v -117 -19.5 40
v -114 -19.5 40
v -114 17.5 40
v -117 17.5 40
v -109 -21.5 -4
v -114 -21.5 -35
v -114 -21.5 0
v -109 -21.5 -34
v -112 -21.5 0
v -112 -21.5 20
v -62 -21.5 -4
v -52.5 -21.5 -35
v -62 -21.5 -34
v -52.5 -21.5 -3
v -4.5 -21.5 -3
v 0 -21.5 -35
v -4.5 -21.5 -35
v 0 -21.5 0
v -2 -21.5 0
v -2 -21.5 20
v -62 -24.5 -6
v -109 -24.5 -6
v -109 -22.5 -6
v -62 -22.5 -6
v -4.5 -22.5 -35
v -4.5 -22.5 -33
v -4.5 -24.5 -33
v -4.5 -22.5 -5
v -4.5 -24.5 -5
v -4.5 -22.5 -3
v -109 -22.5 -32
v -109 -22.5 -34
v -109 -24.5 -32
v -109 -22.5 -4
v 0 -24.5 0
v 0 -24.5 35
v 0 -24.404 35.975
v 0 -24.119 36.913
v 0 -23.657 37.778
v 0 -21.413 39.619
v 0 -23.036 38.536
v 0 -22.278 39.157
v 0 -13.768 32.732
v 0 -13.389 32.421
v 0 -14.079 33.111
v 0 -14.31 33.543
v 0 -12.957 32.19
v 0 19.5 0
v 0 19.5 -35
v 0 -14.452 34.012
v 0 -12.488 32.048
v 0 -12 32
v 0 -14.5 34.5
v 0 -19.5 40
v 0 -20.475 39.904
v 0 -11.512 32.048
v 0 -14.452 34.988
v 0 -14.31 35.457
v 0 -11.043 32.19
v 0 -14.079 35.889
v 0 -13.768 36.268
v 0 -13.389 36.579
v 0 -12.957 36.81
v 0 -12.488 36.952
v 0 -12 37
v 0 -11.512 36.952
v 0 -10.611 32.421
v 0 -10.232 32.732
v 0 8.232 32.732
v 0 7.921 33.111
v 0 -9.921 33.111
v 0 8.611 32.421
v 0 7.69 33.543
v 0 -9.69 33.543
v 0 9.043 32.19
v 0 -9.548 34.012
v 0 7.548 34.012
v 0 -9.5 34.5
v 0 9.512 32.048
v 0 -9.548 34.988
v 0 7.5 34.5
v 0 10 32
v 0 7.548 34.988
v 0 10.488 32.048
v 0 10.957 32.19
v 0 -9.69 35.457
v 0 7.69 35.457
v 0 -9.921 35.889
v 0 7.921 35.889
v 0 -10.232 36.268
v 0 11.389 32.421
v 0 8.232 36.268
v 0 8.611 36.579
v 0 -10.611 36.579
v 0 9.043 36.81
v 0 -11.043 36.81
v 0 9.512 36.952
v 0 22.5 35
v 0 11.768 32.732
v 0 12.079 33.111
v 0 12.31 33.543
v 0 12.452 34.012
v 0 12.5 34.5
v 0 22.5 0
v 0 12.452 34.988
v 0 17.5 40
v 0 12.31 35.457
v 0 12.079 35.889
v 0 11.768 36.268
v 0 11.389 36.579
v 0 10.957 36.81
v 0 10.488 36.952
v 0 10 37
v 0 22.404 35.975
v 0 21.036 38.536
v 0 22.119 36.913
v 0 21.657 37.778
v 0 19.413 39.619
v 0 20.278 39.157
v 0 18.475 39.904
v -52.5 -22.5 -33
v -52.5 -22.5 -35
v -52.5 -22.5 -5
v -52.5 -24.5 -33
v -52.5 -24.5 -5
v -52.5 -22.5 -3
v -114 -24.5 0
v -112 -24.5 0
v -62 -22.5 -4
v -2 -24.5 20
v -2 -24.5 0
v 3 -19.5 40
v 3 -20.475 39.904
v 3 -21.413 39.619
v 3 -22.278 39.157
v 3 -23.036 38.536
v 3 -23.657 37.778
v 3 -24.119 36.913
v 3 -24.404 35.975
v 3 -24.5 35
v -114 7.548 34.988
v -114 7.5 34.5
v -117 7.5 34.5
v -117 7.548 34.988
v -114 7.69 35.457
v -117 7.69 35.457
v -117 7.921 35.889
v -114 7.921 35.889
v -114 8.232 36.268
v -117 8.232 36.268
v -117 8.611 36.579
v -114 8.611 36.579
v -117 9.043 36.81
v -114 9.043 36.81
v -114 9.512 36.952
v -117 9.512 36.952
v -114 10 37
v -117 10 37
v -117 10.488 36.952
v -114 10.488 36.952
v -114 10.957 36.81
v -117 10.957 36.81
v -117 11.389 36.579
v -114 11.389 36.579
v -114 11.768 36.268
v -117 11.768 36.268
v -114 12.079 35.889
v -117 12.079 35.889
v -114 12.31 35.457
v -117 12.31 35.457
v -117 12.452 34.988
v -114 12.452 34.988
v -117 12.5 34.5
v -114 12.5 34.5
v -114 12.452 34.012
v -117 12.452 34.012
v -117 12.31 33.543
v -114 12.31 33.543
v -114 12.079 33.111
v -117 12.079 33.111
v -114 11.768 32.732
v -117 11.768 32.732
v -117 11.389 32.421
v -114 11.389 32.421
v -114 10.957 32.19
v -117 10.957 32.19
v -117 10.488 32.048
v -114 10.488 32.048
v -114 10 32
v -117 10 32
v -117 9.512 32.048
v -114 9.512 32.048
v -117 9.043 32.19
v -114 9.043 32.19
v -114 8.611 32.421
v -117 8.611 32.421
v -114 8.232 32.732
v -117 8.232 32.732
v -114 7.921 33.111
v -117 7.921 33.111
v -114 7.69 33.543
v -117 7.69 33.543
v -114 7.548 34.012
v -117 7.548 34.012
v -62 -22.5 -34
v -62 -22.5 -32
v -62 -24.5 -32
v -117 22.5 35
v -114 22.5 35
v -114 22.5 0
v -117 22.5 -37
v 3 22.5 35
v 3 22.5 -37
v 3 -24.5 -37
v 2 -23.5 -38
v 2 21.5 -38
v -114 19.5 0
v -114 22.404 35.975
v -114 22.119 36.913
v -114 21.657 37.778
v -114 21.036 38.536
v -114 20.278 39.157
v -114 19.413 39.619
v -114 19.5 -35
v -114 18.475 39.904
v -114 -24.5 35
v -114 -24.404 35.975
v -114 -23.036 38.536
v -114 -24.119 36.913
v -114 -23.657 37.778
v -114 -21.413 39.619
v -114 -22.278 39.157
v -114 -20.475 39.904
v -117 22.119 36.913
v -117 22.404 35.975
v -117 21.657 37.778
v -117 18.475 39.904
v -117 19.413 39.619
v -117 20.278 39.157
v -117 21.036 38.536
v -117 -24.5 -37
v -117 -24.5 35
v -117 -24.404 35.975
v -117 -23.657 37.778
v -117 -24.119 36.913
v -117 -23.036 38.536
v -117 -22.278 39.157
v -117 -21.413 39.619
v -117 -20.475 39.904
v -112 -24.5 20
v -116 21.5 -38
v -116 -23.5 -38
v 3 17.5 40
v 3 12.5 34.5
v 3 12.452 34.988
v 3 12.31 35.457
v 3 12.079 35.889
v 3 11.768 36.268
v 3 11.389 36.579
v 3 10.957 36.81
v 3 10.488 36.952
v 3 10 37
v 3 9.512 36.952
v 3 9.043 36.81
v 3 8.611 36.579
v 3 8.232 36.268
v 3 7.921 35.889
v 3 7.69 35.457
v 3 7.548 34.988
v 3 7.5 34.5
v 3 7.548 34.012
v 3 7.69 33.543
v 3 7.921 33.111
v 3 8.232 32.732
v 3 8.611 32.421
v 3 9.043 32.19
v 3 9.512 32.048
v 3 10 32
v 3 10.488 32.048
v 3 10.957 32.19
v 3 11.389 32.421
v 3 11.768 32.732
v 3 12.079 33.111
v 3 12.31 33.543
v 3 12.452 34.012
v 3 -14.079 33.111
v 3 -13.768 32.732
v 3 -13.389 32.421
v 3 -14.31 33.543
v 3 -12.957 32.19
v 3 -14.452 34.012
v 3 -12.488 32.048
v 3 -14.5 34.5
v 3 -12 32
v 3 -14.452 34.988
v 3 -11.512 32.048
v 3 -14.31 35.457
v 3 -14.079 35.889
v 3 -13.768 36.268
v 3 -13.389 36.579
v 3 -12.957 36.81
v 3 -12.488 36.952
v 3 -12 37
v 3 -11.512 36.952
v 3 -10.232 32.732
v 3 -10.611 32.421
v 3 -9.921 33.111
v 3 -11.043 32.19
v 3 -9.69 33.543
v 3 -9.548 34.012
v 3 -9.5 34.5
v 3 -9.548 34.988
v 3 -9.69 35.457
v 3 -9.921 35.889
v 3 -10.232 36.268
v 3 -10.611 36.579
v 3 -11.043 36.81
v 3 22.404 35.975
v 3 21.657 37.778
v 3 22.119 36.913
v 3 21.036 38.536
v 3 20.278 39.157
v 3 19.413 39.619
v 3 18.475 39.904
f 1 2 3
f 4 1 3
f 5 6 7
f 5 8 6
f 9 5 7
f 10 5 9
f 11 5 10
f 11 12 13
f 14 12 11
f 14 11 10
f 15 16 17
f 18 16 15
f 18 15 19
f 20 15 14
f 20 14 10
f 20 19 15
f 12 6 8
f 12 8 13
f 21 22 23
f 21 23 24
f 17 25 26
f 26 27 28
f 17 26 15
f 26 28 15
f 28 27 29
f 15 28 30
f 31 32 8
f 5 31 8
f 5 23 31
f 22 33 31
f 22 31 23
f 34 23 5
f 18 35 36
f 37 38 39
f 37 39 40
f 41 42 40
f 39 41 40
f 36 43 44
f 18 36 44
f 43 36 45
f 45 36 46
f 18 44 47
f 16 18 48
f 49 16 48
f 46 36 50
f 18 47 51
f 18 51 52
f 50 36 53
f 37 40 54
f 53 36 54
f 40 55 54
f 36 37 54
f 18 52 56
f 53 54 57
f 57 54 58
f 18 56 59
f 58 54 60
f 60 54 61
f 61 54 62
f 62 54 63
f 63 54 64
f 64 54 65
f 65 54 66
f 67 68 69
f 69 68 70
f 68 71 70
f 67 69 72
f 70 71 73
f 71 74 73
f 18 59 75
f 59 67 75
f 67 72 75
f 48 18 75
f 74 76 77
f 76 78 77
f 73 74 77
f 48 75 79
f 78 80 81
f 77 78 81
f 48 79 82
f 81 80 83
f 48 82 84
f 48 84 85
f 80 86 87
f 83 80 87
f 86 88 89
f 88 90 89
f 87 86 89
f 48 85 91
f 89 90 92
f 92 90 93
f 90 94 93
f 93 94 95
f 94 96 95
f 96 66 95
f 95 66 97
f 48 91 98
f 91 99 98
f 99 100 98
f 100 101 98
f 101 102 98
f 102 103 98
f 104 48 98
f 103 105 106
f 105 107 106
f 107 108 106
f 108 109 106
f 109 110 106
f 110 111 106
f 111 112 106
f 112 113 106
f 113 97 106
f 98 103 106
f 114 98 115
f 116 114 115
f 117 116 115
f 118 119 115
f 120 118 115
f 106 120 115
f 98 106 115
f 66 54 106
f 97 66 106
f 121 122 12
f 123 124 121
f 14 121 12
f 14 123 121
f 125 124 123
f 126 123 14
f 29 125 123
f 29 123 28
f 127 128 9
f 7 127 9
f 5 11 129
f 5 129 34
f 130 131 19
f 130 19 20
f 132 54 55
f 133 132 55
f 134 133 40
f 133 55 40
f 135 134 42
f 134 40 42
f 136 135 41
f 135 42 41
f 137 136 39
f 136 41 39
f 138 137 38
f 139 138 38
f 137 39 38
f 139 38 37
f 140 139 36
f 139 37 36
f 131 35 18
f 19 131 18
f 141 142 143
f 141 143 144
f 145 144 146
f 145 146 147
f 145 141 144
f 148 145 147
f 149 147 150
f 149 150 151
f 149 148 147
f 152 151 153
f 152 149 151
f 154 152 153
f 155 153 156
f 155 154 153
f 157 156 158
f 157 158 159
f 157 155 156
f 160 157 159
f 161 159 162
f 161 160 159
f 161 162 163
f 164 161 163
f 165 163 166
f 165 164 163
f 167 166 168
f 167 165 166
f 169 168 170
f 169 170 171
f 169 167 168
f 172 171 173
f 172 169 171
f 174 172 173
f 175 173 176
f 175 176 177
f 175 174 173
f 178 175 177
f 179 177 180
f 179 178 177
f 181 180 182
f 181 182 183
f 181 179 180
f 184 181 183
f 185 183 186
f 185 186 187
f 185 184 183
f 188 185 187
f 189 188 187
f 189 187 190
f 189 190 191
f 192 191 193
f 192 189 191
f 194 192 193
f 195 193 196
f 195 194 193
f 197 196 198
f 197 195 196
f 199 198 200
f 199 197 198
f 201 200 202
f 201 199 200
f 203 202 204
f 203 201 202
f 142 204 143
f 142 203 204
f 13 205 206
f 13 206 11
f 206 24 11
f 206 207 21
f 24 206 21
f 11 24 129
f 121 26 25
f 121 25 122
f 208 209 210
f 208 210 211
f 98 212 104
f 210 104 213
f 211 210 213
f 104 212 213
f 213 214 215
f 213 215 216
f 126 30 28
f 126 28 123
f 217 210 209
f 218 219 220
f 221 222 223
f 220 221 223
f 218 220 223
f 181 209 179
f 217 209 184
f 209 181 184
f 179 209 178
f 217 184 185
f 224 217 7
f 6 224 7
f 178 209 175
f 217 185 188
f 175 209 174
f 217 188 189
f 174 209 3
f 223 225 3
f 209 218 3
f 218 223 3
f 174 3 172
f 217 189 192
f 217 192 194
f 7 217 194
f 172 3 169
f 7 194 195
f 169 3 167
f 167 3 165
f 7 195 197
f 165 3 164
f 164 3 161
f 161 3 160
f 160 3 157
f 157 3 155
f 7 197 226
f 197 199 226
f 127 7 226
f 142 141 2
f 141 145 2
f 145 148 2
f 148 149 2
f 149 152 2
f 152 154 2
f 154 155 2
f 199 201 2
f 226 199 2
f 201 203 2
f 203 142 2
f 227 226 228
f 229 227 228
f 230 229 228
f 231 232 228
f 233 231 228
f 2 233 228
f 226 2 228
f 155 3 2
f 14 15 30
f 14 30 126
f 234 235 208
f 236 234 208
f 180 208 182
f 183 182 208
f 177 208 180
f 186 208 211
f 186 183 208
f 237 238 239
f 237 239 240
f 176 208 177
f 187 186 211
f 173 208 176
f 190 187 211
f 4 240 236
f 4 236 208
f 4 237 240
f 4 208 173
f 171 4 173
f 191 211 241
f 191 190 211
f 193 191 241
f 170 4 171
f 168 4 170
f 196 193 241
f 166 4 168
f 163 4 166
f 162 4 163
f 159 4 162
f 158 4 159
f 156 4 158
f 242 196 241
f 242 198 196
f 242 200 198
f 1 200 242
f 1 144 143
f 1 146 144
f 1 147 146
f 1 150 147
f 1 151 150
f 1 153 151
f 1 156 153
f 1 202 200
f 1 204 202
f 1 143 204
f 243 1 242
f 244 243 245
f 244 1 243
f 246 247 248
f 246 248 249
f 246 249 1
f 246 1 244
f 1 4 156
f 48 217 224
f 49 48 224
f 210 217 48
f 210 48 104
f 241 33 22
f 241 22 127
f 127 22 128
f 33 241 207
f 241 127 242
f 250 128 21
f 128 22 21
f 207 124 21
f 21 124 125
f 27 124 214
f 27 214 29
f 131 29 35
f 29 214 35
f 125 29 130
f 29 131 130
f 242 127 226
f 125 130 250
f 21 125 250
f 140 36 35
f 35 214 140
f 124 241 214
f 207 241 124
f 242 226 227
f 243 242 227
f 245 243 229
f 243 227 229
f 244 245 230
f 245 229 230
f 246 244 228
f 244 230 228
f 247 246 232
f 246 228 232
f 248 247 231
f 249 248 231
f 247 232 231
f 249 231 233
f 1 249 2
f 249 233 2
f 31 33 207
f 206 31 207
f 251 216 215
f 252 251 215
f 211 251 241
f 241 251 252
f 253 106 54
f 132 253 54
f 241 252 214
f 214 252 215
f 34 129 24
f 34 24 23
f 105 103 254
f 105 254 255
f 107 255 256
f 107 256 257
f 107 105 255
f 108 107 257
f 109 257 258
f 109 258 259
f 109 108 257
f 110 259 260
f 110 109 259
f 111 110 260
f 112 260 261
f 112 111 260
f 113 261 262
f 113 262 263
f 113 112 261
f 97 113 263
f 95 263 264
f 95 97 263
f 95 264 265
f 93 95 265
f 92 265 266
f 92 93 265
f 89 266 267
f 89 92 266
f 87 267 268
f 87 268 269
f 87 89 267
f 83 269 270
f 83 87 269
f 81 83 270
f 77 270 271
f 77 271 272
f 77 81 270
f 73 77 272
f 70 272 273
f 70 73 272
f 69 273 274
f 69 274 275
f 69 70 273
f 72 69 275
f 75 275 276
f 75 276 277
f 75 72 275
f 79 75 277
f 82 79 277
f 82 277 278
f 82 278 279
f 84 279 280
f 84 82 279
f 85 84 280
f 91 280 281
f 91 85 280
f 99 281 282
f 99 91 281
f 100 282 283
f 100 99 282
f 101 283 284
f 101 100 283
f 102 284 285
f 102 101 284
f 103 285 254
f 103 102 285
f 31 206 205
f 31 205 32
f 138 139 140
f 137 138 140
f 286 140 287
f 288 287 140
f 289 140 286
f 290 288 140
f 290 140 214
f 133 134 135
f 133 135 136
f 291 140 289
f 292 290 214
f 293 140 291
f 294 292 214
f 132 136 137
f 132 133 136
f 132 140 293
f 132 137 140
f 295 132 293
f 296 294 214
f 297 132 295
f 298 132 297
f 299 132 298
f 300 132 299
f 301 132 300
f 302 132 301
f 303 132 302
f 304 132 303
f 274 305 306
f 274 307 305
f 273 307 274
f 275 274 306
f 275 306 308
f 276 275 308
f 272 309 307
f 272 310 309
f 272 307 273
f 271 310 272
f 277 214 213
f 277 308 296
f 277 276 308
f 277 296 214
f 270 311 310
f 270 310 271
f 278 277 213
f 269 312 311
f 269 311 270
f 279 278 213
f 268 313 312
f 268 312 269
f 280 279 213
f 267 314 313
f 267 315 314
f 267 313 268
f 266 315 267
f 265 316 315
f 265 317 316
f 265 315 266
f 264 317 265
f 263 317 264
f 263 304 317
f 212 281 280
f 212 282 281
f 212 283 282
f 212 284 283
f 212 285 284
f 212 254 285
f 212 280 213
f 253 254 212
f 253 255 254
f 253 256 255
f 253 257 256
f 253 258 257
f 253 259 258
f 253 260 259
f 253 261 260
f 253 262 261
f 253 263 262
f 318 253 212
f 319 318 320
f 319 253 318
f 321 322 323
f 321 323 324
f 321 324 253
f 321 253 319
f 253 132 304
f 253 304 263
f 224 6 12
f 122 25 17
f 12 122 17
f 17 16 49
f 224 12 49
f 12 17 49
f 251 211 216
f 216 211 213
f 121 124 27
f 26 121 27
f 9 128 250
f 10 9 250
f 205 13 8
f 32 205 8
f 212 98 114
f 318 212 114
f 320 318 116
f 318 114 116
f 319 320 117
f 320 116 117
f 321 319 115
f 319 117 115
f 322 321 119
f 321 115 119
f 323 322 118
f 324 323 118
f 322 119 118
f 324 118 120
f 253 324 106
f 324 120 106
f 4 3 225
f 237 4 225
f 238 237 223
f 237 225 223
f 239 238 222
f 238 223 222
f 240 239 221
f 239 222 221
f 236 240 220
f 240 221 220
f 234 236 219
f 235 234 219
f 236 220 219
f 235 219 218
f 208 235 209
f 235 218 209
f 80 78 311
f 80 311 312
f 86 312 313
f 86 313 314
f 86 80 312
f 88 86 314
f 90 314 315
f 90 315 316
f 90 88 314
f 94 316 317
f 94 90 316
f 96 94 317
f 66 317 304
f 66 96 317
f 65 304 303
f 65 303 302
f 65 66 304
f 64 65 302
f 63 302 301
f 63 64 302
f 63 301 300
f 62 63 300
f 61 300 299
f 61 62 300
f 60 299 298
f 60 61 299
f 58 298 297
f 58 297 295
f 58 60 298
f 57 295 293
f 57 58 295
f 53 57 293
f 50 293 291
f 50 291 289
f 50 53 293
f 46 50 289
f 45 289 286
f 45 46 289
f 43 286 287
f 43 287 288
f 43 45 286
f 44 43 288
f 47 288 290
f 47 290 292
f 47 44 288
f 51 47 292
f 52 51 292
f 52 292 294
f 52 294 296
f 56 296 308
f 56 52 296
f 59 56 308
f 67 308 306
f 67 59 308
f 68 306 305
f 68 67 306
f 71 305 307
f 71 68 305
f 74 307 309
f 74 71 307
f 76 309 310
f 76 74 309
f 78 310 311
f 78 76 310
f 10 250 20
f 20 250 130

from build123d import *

# Parameters (mm, degrees)
F2_R      = 2.5
F3_DEPTH  = 3
F4_W      = 3
F4_H      = 35
F4_H_2    = 3
F4_W_2    = 41
F5_DEPTH  = 114
F6_R      = 2.5
F7_DEPTH  = 3
F8_W      = 110
F8_H      = 20
F9_DEPTH  = 3
F10_W     = 47
F10_H     = 26
F10_W_2   = 48
F10_H_2   = 28
F11_DEPTH = 3
F12_SIZE  = 1
F14_W     = 48
F14_H     = 2
F14_W_2   = 47
F15_DEPTH = 1


with BuildPart() as f3:
    # F2 (on Right) → F3 (new body)
    with BuildSketch(Plane.YZ):
        with BuildLine():
            ThreePointArc((22.5, 35), (21.0355339059, 38.5355339059), (17.5, 40))
            Line((17.5, 40), (-19.5, 40))
            ThreePointArc((-19.5, 40), (-23.0355339059, 38.5355339059), (-24.5, 35))
            Line((-24.5, 35), (-24.5, -38))
            Line((-24.5, -38), (22.5, -38))
            Line((22.5, -38), (22.5, 35))
        make_face()
        with Locations((-12, 34.5)):
            Circle(F2_R, mode=Mode.SUBTRACT)
        with Locations((10, 34.5)):
            Circle(F2_R, mode=Mode.SUBTRACT)
    extrude(amount=F3_DEPTH)

    # F4 (on Right) → F5 (join)
    with BuildSketch(Plane.YZ):
        with Locations((-23, -17.5)):
            Rectangle(F4_W, F4_H)
        with Locations((21, -36.5)):
            Rectangle(F4_W, F4_H_2)
        with Locations((21, -17.5)):
            Rectangle(F4_W, F4_H)
        with Locations((-1, -36.5)):
            Rectangle(F4_W_2, F4_H_2)
        with Locations((-23, -36.5)):
            Rectangle(F4_W, F4_H_2)
    extrude(amount=-F5_DEPTH)

    # F6 (on face) → F7 (join)
    with BuildSketch(Plane(origin=(-114, 0, 0), x_dir=(0, -1, 0), z_dir=(-1, 0, 0))):
        with BuildLine():
            ThreePointArc((24.5, 35), (23.0355339059, 38.5355339059), (19.5, 40))
            Line((19.5, 40), (-17.5, 40))
            ThreePointArc((-17.5, 40), (-21.0355339059, 38.5355339059), (-22.5, 35))
            Line((-22.5, 35), (-22.5, -38))
            Line((-22.5, -38), (24.5, -38))
            Line((24.5, -38), (24.5, 35))
        make_face()
        with Locations((-10, 34.5)):
            Circle(F6_R, mode=Mode.SUBTRACT)
    extrude(amount=F7_DEPTH)

    # F8 (on face) → F9 (join)
    with BuildSketch(Plane.XZ.offset(24.5)):
        with Locations((-57, 10)):
            Rectangle(F8_W, F8_H)
    extrude(amount=-F9_DEPTH)

    # F10 (on face) → F11 (cut, through all)
    with BuildSketch(Plane.XZ.offset(24.5)):
        with Locations((-85.5, -19)):
            Rectangle(F10_W, F10_H)
        with Locations((-28.5, -19)):
            Rectangle(F10_W_2, F10_H_2)
    extrude(amount=-F11_DEPTH, mode=Mode.SUBTRACT)

    # F12
    f12_edges = [f3.edges().sort_by_distance(p)[0] for p in [
        (-57, -24.5, -38),
        (3, -1, -38),
        (-57, 22.5, -38),
        (-117, -1, -38),
    ]]
    chamfer(f12_edges, length=F12_SIZE)

    # F14 (on face) → F15 (cut)
    with BuildSketch(Plane(origin=(0, -21.5, 0), x_dir=(-1, 0, 0), z_dir=(0, 1, 0))):
        with Locations((28.5, -34)):
            Rectangle(F14_W, F14_H)
        with Locations((85.5, -33)):
            Rectangle(F14_W_2, F14_H)
        with Locations((85.5, -5)):
            Rectangle(F14_W_2, F14_H)
        with Locations((28.5, -4)):
            Rectangle(F14_W, F14_H)
    extrude(amount=-F15_DEPTH, mode=Mode.SUBTRACT)


solid = f3.part
